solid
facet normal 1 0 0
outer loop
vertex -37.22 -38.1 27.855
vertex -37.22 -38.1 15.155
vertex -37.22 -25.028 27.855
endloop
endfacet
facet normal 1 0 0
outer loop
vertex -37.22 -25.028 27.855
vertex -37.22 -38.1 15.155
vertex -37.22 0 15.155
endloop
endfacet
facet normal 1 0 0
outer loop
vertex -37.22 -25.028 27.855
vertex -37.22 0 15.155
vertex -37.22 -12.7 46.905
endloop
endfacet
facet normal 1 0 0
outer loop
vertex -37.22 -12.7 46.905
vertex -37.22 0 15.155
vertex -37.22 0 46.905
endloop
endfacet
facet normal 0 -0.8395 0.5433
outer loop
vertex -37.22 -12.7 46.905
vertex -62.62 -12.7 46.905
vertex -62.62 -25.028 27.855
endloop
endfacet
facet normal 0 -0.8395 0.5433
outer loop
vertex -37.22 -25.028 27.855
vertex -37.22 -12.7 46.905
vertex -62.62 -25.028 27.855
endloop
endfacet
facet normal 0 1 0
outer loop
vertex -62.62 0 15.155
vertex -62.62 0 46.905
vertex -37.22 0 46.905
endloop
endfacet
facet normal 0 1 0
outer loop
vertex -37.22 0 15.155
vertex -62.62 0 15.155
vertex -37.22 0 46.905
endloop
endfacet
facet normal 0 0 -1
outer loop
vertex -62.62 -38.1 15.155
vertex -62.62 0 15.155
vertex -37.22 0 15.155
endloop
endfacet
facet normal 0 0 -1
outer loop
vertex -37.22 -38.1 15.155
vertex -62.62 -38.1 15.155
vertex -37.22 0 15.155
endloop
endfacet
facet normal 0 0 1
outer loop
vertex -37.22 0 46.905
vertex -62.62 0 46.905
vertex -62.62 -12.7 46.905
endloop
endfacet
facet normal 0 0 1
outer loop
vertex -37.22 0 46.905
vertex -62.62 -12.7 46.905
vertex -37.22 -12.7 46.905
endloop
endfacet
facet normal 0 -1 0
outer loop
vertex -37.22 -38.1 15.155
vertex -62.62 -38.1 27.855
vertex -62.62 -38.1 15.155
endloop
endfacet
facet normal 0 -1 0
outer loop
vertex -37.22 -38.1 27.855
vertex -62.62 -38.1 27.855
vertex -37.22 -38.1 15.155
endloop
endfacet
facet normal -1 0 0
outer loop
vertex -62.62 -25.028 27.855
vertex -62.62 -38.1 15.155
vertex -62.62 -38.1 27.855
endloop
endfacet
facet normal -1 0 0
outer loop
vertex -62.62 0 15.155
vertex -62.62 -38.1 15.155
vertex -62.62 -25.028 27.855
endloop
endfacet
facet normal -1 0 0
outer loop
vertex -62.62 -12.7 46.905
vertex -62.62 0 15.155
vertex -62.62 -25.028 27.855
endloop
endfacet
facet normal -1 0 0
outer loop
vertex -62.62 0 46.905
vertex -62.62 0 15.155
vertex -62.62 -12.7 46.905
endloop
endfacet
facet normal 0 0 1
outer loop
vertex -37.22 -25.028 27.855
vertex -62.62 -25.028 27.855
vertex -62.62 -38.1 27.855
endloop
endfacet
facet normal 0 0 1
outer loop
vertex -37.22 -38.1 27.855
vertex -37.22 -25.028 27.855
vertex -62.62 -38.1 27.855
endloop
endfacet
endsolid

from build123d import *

# Parameters (mm, degrees)
F0_W     = 25.4
F0_H     = 31.75
F1_DEPTH = 38.1
F3_DEPTH = 25.401


with BuildPart() as f1:
    # F0 (on Front) → F1 (new body)
    with BuildSketch(Plane.XZ):
        with Locations((-49.920441, 31.029846)):
            Rectangle(F0_W, F0_H)
    extrude(amount=F1_DEPTH)

    # F2 (on face) → F3 (cut, through all)
    with BuildSketch(Plane(origin=(-62.620441, 0, 0), x_dir=(0, -1, 0), z_dir=(-1, 0, 0))):
        Polygon((38.1, 46.904846), (12.7, 46.904846), (25.028251, 27.854846), (38.1, 27.854846), align=None)
    extrude(amount=-F3_DEPTH, mode=Mode.SUBTRACT)


solid = f1.part
